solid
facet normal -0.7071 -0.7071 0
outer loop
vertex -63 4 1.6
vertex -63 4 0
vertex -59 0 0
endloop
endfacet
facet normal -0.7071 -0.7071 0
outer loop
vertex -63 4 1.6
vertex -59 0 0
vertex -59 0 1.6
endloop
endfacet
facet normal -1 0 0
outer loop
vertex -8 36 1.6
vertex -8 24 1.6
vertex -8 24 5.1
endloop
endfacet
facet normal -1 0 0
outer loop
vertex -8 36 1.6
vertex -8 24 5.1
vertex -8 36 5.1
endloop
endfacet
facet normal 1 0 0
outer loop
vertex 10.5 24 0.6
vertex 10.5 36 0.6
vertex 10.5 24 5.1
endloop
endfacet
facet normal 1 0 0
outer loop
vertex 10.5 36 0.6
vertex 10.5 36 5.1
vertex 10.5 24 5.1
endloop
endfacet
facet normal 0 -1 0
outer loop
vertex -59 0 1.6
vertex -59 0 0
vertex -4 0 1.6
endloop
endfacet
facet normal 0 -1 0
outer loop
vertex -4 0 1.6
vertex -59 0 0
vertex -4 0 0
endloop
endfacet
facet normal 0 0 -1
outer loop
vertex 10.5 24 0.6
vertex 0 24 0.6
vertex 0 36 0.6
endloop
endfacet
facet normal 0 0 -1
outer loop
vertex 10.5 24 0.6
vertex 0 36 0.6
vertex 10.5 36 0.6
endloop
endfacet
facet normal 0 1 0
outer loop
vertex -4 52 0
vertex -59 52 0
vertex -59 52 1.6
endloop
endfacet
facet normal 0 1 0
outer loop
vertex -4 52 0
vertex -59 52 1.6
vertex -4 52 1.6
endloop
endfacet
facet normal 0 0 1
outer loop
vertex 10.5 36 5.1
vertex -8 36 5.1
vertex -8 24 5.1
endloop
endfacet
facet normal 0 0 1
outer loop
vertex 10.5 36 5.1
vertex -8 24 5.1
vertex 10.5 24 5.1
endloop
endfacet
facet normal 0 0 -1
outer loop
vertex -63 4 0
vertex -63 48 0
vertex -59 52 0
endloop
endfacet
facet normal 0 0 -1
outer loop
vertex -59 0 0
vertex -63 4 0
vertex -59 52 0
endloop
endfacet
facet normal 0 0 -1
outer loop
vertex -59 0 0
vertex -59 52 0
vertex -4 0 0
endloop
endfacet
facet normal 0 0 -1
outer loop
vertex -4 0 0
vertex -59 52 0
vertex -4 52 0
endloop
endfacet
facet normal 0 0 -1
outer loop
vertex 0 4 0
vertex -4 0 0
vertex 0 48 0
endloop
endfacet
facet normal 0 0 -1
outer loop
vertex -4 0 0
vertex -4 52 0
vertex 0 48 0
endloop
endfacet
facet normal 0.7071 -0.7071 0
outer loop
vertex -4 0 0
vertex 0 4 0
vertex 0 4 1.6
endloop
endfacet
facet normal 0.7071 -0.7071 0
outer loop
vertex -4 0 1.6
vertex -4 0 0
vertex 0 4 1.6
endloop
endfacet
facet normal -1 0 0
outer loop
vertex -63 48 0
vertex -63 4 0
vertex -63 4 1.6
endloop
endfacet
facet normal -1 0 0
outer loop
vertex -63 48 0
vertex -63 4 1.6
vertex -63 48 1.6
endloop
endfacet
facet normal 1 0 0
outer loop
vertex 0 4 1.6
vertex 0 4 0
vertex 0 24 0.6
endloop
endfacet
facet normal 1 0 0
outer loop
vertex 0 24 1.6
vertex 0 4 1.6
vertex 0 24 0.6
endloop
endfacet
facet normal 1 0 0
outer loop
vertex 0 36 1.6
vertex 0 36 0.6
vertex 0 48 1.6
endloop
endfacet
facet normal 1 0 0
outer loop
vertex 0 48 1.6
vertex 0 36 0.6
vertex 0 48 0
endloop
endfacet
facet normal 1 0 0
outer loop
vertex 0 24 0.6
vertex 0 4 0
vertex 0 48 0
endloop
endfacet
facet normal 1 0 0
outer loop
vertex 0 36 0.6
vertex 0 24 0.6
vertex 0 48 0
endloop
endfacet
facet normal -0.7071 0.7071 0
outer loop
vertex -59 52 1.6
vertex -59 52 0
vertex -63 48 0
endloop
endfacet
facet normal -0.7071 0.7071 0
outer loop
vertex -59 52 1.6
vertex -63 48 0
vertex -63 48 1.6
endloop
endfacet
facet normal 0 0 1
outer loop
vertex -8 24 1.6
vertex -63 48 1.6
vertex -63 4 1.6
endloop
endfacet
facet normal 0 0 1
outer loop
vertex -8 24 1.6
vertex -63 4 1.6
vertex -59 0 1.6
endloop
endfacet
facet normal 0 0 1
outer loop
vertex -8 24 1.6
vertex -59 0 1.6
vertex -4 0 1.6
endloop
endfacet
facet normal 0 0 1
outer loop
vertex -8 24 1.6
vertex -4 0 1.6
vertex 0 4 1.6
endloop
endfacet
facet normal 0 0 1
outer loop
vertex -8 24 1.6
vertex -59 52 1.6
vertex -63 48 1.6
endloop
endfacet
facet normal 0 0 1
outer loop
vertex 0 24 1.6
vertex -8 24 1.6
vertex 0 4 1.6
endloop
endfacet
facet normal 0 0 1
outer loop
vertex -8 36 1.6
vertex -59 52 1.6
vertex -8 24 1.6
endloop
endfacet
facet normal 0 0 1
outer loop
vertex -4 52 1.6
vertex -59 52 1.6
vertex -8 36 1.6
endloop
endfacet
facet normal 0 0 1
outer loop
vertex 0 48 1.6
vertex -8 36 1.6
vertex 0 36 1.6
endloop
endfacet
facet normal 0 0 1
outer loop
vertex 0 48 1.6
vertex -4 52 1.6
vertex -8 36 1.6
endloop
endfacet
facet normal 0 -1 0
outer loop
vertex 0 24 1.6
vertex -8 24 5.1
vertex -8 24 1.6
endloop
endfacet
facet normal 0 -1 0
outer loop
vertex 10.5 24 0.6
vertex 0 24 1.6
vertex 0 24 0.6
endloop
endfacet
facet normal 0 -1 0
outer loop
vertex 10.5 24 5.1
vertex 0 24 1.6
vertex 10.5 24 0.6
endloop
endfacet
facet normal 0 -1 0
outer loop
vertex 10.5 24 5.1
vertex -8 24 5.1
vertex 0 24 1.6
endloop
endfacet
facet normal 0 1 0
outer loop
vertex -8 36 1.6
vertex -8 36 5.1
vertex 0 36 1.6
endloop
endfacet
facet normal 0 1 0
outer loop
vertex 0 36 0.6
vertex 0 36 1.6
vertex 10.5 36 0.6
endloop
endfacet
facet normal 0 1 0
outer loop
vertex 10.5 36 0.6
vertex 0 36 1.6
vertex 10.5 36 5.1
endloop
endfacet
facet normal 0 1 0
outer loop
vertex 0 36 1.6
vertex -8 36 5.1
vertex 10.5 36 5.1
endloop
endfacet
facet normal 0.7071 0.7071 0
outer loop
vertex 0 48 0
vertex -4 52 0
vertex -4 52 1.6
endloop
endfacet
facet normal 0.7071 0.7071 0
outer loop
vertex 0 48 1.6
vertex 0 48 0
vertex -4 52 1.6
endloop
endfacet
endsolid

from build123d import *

# Parameters (mm, degrees)
F0_W     = 63
F0_H     = 52
F1_DEPTH = 1.6
F2_W     = 18.5
F2_H     = 12
F3_DEPTH = 3.5
F4_W     = 10.5
F4_H     = 12
F5_DEPTH = 1
F6_SIZE  = 4


with BuildPart() as f1:
    # F0 (on Top) → F1 (new body)
    with BuildSketch(Plane.XY):
        with Locations((-31.5, 26)):
            Rectangle(F0_W, F0_H)
    extrude(amount=F1_DEPTH)

    # F2 (on face) → F3 (join)
    with BuildSketch(Plane.XY.offset(1.6)):
        with Locations((1.25, 30)):
            Rectangle(F2_W, F2_H)
    extrude(amount=F3_DEPTH)

    # F4 (on face) → F5 (join)
    with BuildSketch(Plane(origin=(0, 0, 1.6), x_dir=(1, 0, 0), z_dir=(0, 0, -1))):
        with Locations((5.25, -30)):
            Rectangle(F4_W, F4_H)
    extrude(amount=F5_DEPTH)

    # F6
    f6_edges = [f1.edges().sort_by_distance(p)[0] for p in [
        (-63, 52, 0.8),
        (0, 52, 0.8),
        (-63, 0, 0.8),
        (0, 0, 0.8),
    ]]
    chamfer(f6_edges, length=F6_SIZE)


solid = f1.part
